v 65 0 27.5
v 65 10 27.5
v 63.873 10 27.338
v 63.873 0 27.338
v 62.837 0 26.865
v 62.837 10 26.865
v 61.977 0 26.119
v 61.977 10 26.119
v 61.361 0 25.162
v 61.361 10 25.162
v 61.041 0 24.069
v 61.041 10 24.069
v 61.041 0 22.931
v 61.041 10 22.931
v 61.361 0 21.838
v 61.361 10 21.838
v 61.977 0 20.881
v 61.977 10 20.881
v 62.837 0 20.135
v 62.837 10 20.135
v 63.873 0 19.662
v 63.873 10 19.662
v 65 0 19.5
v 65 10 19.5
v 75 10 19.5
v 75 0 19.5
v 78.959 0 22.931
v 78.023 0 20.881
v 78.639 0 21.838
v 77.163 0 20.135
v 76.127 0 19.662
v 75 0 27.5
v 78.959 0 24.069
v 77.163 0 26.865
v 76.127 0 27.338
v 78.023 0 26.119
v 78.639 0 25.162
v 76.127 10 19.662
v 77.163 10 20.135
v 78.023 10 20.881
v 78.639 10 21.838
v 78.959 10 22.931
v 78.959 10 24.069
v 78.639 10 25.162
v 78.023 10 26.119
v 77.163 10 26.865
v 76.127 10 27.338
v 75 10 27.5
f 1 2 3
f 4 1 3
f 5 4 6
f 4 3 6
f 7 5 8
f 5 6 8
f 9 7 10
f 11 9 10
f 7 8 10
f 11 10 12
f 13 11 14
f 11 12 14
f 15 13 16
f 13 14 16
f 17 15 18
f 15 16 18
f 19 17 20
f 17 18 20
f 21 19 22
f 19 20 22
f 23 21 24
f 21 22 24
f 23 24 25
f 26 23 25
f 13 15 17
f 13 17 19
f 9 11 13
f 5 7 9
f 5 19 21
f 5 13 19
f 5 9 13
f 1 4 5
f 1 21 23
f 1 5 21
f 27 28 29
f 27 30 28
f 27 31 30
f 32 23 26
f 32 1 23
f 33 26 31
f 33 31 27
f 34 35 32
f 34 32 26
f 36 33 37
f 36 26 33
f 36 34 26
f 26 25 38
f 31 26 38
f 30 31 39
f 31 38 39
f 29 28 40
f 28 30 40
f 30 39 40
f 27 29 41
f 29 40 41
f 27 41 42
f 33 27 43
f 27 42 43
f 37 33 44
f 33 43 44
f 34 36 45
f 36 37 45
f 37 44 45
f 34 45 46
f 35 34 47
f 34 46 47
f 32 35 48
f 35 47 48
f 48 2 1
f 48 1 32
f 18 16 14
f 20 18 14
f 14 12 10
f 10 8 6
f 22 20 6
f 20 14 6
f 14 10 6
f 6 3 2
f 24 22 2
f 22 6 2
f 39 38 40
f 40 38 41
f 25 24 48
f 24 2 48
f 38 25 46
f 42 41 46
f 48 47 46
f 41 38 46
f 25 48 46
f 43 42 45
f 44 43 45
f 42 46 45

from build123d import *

# Parameters (mm, degrees)
CYLINDER103_R     = 4
CYLINDER103_DEPTH = 10
CYLINDER104_R     = 4
CYLINDER104_DEPTH = 10
BOX069_W          = 10
BOX069_H          = 10
BOX069_DEPTH      = 8


with BuildPart() as usbccut001:
    # Cylinder103 → Cylinder103 (new body)
    with BuildSketch(Plane(origin=(65, 10, 23.5), x_dir=(1, 0, 0), z_dir=(0, -1, 0))):
        Circle(CYLINDER103_R)
    extrude(amount=CYLINDER103_DEPTH)


with BuildPart() as usbccut002:
    # Cylinder104 → Cylinder104 (new body)
    with BuildSketch(Plane(origin=(75, 10, 23.5), x_dir=(1, 0, 0), z_dir=(0, -1, 0))):
        Circle(CYLINDER104_R)
    extrude(amount=CYLINDER104_DEPTH)


with BuildPart() as usbccut003:
    # Box069 → Box069 (new body)
    with BuildSketch(Plane(origin=(65, 0, 19.5), x_dir=(1, 0, 0), z_dir=(0, 0, 1))):
        with Locations((5, 5)):
            Rectangle(BOX069_W, BOX069_H)
    extrude(amount=BOX069_DEPTH)

    # Fusion047: union usbCCut001, usbCCut002
    add(usbccut001.part)
    add(usbccut002.part)


solid = usbccut003.part
